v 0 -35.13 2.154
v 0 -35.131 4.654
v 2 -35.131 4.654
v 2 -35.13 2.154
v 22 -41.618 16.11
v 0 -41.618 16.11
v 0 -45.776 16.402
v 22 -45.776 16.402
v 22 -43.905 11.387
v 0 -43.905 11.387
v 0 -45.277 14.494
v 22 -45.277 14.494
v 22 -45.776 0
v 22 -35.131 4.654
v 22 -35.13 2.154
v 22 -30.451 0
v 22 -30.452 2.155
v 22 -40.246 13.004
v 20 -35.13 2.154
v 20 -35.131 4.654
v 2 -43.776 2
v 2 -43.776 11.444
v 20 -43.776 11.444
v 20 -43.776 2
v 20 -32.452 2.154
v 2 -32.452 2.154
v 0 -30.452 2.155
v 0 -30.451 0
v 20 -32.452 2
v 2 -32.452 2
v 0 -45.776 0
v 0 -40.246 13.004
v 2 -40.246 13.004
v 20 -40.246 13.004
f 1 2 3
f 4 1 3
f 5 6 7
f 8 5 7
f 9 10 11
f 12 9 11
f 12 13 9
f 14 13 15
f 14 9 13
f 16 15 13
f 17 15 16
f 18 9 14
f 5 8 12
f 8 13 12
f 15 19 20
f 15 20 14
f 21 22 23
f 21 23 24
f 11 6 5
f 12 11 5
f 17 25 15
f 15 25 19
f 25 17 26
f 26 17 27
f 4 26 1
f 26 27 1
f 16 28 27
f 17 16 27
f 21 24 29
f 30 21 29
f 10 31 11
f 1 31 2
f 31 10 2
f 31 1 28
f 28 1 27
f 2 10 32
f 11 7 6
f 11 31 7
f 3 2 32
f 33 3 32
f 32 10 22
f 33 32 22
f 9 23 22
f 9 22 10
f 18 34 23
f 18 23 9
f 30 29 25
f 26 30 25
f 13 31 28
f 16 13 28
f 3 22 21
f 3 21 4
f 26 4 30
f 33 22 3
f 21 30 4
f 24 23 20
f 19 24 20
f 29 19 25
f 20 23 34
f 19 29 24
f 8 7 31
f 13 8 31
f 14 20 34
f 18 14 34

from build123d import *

# Parameters (mm, degrees)
F1_DEPTH = 22
F2_T     = 2
F3_DEPTH = 4
F4_DEPTH = 2.5


# Not quite as in the source:
# - a shell that OpenCascade refuses in one call is made with other operations: the cavity is built on its own and cut out
# - a feature names something its author has since deleted; it is built from what else it names


with BuildPart() as f1:
    # F0 (on Right) → F1 (new body)
    with BuildSketch(Plane.YZ):
        Polygon((-45.7758642733, 0), (-30.4509963948, 0), (-30.4525867105, 4.6551725827), (-35.1306907833, 4.6535744332), (-40.2460545301, 13.0035160109), (-41.6182950139, 16.1101743579), (-45.7758642733, 16.402374953), align=None)
    extrude(amount=F1_DEPTH)

    # F2: shell of thickness 2, made by hand


with BuildPart() as f2_core1:
    # F2_t2: copy of F1
    add(f1.part)

    # the walls: a layer under each face that stays
    f2_faces = [f2_core1.faces().sort_by_distance(p)[0] for p in [
        (11, -40.932174772, 14.5568451844),
        (11, -43.6970796436, 16.2562746555),
        (11, -45.7758642733, 8.2011874765),
        (11, -38.1134303341, 0),
        (11, -30.4517915527, 2.3275862914),
        (11, -32.7916387469, 4.6543735079),
        (0, -38.1134303341, 8.2011874765),
        (22, -38.1134303341, 8.2011874765),
    ]]
    thicken(f2_faces, amount=-F2_T, mode=Mode.SUBTRACT)


with BuildPart() as f1_1:
    add(f1.part)

    # what is left inside the walls is the cavity
    f2_cavity = [f2_core1.part.solids().sort_by_distance(p)[0] for p in [
        (14, -43.755864, 8.128439),
    ]]
    add(f2_cavity, mode=Mode.SUBTRACT)

    # F3 (cut): a face of the model
    f3_faces = [f1_1.faces().sort_by_distance(p)[0] for p in [
        (11, -40.932174772, 14.5568451844),
    ]]
    extrude(f3_faces, amount=-F3_DEPTH, mode=Mode.SUBTRACT)

    # F4 (cut): a face of the model
    f4_faces = [f1_1.faces().sort_by_distance(p)[0] for p in [
        (11, -32.7916387469, 4.6543735079),
    ]]
    extrude(f4_faces, amount=-F4_DEPTH, mode=Mode.SUBTRACT)


solid = f1_1.part
